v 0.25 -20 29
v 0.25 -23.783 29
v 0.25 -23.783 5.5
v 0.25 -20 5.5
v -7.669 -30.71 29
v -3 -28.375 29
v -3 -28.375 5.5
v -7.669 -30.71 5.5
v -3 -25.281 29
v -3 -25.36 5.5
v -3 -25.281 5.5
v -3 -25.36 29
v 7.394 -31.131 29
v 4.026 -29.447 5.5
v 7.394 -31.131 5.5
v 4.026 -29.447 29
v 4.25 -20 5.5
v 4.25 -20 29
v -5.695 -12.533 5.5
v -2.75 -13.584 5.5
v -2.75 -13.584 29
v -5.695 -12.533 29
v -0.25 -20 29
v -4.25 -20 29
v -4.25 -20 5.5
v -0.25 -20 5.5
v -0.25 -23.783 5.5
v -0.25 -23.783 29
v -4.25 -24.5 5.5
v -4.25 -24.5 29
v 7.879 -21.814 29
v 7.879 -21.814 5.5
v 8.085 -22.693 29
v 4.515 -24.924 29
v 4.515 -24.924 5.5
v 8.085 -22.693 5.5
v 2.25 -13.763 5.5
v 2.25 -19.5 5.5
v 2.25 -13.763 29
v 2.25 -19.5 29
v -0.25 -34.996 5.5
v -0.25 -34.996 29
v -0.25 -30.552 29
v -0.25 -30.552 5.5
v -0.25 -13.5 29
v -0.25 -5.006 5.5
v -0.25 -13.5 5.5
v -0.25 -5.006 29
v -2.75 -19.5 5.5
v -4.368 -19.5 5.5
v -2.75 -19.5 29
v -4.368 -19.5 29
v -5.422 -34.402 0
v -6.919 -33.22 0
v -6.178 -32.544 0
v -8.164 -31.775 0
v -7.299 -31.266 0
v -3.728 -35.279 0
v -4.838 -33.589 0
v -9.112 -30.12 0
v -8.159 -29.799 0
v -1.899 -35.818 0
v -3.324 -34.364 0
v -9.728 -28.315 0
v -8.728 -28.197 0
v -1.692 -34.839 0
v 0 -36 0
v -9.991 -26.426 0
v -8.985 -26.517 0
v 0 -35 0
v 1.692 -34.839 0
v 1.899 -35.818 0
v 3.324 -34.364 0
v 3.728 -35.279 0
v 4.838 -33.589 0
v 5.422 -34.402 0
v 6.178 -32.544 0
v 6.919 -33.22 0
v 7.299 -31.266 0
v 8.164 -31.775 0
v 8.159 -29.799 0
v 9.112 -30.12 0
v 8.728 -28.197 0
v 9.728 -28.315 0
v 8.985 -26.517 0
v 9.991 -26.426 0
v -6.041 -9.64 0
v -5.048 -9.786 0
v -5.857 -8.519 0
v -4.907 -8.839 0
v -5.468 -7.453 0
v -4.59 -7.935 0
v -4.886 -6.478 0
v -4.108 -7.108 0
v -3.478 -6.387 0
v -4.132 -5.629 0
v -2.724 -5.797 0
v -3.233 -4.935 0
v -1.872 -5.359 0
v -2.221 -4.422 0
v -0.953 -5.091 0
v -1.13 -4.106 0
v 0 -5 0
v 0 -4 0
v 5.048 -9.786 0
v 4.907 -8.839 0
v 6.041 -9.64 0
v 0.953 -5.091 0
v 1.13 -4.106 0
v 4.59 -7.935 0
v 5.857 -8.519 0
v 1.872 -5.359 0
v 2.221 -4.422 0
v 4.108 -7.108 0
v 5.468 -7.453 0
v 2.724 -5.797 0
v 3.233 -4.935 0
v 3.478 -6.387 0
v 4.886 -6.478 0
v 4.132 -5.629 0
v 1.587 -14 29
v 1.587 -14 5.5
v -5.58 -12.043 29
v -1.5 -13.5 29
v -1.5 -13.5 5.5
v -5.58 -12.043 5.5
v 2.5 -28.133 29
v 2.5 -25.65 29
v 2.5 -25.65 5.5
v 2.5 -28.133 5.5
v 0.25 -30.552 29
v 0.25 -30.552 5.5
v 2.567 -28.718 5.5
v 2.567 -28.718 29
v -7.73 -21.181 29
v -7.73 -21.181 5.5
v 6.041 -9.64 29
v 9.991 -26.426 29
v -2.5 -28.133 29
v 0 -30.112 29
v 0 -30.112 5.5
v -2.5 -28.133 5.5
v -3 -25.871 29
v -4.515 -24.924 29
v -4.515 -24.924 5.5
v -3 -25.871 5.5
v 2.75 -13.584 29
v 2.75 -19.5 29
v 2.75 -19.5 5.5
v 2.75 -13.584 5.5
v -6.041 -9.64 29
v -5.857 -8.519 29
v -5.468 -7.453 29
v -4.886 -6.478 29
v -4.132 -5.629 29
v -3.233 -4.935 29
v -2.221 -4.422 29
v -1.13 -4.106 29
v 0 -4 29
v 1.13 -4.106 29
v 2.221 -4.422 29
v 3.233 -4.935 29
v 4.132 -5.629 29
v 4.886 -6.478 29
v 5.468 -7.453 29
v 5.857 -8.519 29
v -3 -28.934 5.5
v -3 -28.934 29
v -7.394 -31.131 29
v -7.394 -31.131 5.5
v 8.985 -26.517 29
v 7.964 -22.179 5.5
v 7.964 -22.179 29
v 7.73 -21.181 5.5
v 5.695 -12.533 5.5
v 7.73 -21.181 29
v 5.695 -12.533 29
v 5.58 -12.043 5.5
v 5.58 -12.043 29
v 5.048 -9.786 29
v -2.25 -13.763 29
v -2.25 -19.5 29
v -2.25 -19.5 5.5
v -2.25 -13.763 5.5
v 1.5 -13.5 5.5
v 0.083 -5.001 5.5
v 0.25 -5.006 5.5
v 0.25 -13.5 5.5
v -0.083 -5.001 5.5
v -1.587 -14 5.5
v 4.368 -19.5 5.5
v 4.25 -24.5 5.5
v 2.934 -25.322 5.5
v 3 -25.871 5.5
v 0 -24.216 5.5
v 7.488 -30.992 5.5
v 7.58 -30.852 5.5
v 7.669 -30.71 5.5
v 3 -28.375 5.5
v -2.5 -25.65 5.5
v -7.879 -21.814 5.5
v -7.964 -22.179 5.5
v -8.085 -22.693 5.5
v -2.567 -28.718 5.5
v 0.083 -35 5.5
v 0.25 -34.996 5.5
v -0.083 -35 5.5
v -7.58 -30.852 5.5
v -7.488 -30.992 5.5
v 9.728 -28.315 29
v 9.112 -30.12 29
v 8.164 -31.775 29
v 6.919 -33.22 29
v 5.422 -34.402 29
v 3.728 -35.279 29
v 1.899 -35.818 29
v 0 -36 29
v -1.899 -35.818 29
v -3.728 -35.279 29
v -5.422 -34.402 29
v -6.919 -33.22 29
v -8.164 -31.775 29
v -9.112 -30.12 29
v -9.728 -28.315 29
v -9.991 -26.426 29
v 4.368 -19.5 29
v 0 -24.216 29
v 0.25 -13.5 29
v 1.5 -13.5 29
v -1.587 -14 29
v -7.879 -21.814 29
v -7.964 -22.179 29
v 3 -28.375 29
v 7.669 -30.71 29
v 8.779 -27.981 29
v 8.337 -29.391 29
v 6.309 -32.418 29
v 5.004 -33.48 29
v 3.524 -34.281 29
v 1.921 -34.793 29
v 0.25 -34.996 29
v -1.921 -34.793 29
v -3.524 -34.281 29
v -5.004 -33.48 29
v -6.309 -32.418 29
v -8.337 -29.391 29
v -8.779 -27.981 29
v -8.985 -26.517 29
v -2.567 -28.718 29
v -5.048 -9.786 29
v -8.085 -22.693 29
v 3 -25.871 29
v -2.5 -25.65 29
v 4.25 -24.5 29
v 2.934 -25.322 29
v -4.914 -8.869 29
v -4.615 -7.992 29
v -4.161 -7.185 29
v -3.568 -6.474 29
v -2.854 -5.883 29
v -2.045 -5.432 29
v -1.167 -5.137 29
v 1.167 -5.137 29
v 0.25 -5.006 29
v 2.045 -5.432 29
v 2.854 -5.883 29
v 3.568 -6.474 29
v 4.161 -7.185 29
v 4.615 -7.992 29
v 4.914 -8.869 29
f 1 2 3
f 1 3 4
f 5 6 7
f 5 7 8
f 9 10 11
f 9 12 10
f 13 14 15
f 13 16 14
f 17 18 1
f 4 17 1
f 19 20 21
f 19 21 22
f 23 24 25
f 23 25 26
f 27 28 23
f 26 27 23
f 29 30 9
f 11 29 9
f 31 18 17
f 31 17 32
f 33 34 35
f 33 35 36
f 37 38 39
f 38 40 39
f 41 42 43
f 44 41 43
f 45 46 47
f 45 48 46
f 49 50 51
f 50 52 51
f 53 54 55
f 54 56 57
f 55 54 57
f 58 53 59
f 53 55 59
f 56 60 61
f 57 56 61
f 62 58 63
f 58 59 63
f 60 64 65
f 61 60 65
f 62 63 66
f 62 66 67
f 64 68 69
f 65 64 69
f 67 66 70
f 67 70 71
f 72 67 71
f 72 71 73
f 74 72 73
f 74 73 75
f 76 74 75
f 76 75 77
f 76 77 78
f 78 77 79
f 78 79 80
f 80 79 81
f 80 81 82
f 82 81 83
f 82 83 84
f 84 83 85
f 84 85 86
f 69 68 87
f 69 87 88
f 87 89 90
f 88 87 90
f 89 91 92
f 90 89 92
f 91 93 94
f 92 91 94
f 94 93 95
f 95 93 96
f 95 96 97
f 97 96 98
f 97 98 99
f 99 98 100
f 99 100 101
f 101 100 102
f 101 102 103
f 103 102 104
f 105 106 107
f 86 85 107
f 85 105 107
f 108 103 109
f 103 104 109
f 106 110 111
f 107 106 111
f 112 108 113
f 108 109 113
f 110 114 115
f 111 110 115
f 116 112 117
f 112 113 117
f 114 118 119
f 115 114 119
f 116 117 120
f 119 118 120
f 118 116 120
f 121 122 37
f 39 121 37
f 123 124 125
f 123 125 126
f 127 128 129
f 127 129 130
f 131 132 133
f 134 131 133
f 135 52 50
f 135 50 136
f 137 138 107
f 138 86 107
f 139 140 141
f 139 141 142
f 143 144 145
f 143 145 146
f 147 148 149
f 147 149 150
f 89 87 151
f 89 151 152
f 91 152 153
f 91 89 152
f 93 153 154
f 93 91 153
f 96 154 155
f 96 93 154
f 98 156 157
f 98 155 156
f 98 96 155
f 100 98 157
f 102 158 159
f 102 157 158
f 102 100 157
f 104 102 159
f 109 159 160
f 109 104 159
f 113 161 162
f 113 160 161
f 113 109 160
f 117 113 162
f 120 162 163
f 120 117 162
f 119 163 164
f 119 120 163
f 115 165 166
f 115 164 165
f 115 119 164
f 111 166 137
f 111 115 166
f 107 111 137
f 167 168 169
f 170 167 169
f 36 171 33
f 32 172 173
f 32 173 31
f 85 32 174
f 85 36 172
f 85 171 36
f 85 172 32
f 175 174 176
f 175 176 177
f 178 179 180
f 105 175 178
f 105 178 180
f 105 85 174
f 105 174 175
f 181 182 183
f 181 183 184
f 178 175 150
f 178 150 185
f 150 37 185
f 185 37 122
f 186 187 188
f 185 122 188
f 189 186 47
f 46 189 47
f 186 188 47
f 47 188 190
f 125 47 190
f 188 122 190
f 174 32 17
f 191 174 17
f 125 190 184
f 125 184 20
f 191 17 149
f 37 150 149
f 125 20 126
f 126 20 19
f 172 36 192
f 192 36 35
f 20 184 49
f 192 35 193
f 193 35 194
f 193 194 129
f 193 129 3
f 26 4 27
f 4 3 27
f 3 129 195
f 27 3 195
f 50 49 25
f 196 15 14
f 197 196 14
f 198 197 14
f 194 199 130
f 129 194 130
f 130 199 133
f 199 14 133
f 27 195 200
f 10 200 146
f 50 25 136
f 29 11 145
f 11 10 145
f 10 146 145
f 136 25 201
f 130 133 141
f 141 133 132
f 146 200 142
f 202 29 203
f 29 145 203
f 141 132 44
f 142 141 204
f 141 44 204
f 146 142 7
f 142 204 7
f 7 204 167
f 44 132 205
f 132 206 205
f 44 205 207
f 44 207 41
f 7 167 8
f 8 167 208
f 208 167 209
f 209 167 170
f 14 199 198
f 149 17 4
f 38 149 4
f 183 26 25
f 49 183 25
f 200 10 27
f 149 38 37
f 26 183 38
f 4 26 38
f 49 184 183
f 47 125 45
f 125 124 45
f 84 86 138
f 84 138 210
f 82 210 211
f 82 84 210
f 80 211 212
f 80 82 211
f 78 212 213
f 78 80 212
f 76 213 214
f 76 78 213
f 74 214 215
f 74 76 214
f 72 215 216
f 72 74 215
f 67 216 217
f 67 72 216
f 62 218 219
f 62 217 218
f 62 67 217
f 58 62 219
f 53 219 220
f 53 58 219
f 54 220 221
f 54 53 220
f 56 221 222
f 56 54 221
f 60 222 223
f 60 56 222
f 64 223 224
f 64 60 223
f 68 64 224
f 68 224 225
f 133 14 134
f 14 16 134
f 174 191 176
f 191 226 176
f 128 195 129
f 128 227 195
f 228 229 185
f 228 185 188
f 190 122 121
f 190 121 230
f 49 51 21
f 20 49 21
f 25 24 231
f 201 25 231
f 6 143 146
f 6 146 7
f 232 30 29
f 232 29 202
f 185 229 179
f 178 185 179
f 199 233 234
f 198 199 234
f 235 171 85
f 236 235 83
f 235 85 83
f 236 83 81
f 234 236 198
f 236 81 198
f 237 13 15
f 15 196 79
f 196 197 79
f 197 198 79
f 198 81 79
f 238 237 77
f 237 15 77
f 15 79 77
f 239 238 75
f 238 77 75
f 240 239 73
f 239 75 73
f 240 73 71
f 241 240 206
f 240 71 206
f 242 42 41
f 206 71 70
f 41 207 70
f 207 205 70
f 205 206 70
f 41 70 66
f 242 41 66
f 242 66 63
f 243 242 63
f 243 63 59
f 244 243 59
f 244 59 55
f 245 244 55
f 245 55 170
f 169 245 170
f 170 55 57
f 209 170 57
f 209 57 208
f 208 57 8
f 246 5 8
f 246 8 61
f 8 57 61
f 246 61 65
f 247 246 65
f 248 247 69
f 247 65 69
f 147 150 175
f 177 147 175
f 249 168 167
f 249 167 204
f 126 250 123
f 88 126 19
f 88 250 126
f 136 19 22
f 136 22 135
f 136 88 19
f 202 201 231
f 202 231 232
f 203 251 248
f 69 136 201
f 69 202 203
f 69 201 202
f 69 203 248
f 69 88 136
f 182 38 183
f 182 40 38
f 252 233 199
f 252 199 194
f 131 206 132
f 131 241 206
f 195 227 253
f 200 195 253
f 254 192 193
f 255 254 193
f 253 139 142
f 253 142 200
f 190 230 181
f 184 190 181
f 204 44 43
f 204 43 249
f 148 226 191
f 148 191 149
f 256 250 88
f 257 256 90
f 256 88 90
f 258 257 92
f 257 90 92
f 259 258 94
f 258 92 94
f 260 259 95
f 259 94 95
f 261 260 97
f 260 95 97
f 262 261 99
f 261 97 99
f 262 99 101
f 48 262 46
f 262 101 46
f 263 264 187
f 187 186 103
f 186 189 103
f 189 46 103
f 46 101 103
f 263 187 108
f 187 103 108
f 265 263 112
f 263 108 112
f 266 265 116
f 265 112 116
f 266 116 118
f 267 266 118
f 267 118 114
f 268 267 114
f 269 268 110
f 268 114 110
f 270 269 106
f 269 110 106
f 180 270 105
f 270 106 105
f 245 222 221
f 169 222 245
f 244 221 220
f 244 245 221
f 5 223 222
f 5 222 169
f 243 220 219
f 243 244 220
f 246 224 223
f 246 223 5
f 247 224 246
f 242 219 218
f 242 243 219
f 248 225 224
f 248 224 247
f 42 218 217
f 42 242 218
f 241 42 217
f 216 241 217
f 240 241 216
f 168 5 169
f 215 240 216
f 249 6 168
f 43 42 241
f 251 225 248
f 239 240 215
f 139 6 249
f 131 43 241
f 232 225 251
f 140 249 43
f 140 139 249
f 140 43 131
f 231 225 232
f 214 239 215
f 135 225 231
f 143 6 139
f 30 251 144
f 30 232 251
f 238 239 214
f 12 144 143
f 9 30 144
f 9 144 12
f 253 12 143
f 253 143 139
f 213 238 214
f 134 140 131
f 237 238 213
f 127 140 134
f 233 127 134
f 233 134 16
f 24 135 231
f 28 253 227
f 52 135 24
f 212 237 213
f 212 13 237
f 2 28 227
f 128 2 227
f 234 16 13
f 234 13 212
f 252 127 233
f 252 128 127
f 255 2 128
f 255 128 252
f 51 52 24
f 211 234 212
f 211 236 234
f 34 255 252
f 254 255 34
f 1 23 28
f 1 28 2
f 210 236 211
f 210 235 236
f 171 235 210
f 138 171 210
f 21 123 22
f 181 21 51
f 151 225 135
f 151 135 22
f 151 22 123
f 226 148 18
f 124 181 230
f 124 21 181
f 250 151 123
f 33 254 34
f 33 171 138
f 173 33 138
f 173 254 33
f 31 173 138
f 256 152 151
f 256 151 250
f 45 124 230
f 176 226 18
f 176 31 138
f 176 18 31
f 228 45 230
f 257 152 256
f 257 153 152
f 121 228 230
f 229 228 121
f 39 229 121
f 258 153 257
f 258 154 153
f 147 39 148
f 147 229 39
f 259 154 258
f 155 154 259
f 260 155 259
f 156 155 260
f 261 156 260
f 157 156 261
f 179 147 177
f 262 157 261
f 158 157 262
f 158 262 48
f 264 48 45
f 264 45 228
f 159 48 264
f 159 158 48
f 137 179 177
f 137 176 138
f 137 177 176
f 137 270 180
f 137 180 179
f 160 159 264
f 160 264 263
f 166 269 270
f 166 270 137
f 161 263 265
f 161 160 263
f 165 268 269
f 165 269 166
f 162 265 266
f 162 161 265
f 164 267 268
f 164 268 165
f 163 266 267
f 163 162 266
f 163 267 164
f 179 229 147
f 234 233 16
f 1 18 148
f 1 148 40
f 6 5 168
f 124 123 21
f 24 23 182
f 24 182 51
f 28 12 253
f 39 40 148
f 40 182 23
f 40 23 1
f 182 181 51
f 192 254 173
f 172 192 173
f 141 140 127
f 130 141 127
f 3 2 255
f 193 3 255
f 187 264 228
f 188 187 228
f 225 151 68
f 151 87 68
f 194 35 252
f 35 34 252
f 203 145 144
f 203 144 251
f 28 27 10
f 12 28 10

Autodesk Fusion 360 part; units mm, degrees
sketch "Boceto1" plane through (0, 0, 0) normal (0, 0, 1) x (1, 0, 0)
  line L0 (0, -31.5) -> (3, -31.5) construction
  circle A0 centre (3, -22.5) radius 1.5 construction
  circle A1 centre (3, -10.5) radius 1.5 construction
  circle A2 centre (-5.5, -17.5) radius 1.5 construction
  line L1 (0, -35) -> (0, -31.5) construction
  line L2 (0, -35) -> (0, -5) construction
  line L3 (0, -20) -> (7.4517, -20) construction
  circle A3 centre (0, -16.5) radius 1.5 construction
  circle A4 centre (5.5, -17.5) radius 1.5 construction
  circle A5 centre (-3, -22.5) radius 1.5 construction
  circle A6 centre (-3, -10.5) radius 1.5 construction
  line L4 (0, -20) -> (-7.4517, -20) construction
  circle A7 centre (-5.5, -26.5) radius 1.5 construction
  line L5 (8.9851, -26.5171) -> (5.0484, -9.7858)
  arc A8 (-8.9851, -26.5171) -> (8.9851, -26.5171) centre (0, -26) ccw
  circle A9 centre (0, -26.5) radius 1.5 construction
  circle A10 centre (5.5, -26.5) radius 1.5 construction
  circle A11 centre (3, -31.5) radius 1.5 construction
  line L6 (0, -26.5) -> (5.5, -26.5) construction
  circle A12 centre (-3, -31.5) radius 1.5 construction
  line L7 (0, -35) -> (0, -26.5) construction
  line L8 (-5.0484, -9.7858) -> (-8.9851, -26.5171)
  arc A13 (5.0484, -9.7858) -> (-5.0484, -9.7858) centre (0, -10.0556) ccw
  arc A14 (6.0413, -9.6396) -> (-6.0413, -9.6396) centre (0, -10.0556) ccw
  line L9 (-6.0413, -9.6396) -> (-9.9909, -26.4257)
  arc A15 (-9.9909, -26.4257) -> (9.9909, -26.4257) centre (0, -26) ccw
  line L10 (9.9909, -26.4257) -> (6.0413, -9.6396)
  line L11 (5.5, -17.5) -> (4.5, -17.5) construction
  line L12 (-5.5, -17.5) -> (-4.5, -17.5) construction
  circle A16 centre (4.5, -17.5) radius 1.5 construction
  circle A17 centre (-4.5, -17.5) radius 1.5 construction
  line L13 (3, -10.5) -> (2.5, -10.5) construction
  line L14 (-3, -10.5) -> (-2.5, -10.5) construction
  circle A18 centre (2.5, -10.5) radius 1.5 construction
  circle A19 centre (-2.5, -10.5) radius 1.5 construction
  dimension "d3" = 0
  dimension "d4" = 9
  dimension "d7" = 0
  dimension "d8" = 10
  dimension "d11" = 0
  dimension "d12" = 21
  dimension "d15" = 0
  dimension "d16" = 9
  dimension "d17" = 3
  dimension "d18" = 3.5
  dimension "d19" = 3
  dimension "d20" = 3
  dimension "d21" = 3
  dimension "d22" = 5
  dimension "d23" = 5.5
  dimension "d24" = 1
  dimension "d48" = 1
  dimension "d49" = 1
  dimension "d50" = 3
  dimension "d51" = 3
  dimension "d52" = 0.5
  dimension "d53" = 3
  dimension "d54" = 3
extrude "Extruir1" add sketch "Boceto1" along normal blind 29
sketch "Boceto2" plane through (0, 0, 29) normal (0, 0, 1) x (-1, 0, 0)
  arc A0 (-5.0484, 9.7858) -> (5.0484, 9.7858) centre (0, 10.0556) ccw
  line L0 (-5.0484, 9.7858) -> (-8.9851, 26.5171)
  arc A1 (8.9851, 26.5171) -> (-8.9851, 26.5171) centre (0, 26) ccw
  line L1 (8.9851, 26.5171) -> (5.0484, 9.7858)
  line L2 (-9.9909, 26.4257) -> (-6.0413, 9.6396)
  arc A2 (-6.0413, 9.6396) -> (6.0413, 9.6396) centre (0, 10.0556) ccw
  line L3 (6.0413, 9.6396) -> (9.9909, 26.4257)
  arc A3 (9.9909, 26.4257) -> (-9.9909, 26.4257) centre (0, 26) ccw
  circle A4 centre (-5.5, 26.5) radius 1.5
  circle A5 centre (-3, 31.5) radius 1.5
  circle A6 centre (3, 31.5) radius 1.5
  circle A7 centre (0, 26.5) radius 1.5
  line L4 (0, 35) -> (0, 26.5)
  circle A8 centre (-3, 22.5) radius 1.5
  circle A9 centre (-5.5, 17.5) radius 1.5
  circle A10 centre (-3, 10.5) radius 1.5
  circle A11 centre (3, 10.5) radius 1.5
  circle A12 centre (0, 16.5) radius 1.5
  circle A13 centre (5.5, 17.5) radius 1.5
  circle A14 centre (3, 22.5) radius 1.5
  circle A15 centre (5.5, 26.5) radius 1.5
  line L5 (-3, 31.5) -> (-5.5, 26.5) construction
  line L6 (3, 31.5) -> (5.5, 26.5) construction
  line L7 (-3, 22.5) -> (0, 26.5) construction
  line L8 (-3, 22.5) -> (-5.5, 26.5) construction
  line L9 (-5.5, 17.5) -> (-3, 22.5) construction
  line L10 (-5.5, 17.5) -> (0, 16.5) construction
  line L11 (0, 16.5) -> (-3, 10.5) construction
  line L12 (-4.25, 29) -> (-7.6694, 30.7097)
  line L13 (-4.25, 24.5) -> (-7.9643, 22.1786)
  line L14 (-4.25, 20) -> (-7.8786, 21.8143)
  line L15 (-3, 28.375) -> (2.011, 25.8695) construction
  line L16 (-3, 25.2812) -> (3.382, 29.27) construction
  line L17 (-3, 26.5) -> (-3, 28.375)
  line L18 (0, 23.6397) -> (-3, 25.3603)
  line L19 (0, 30.75) -> (-3, 28.375)
  line L20 (-4.25, 29) -> (-3, 28.375)
  line L21 (-4.25, 24.5) -> (-2.9341, 25.3225)
  line L22 (-4.25, 20) -> (0, 20)
  line L23 (-1.5, 13.5) -> (0, 13.5)
  line L24 (-1.5, 13.5) -> (-5.5795, 12.043)
  line L25 (0, 30.75) -> (3, 28.375)
  line L26 (4.25, 29) -> (7.6694, 30.7097)
  line L27 (4.25, 29) -> (3, 28.375)
  line L28 (3, 26.5) -> (3, 28.375)
  line L29 (3, 25.3603) -> (3, 25.2812)
  line L30 (0, 23.6397) -> (3, 25.3603)
  line L31 (4.25, 24.5) -> (2.9341, 25.3225)
  line L32 (4.25, 24.5) -> (7.9643, 22.1786)
  line L33 (4.25, 20) -> (7.8786, 21.8143)
  line L34 (4.25, 20) -> (0, 20)
  line L35 (1.5, 13.5) -> (5.5795, 12.043)
  line L36 (1.5, 13.5) -> (0, 13.5)
  line L37 (-1.5866, 14) -> (-5.7476, 12.5139)
  line L38 (-1.5866, 14) -> (0, 14)
  line L39 (-4.368, 19.5) -> (0, 19.5)
  line L40 (-4.368, 19.5) -> (-8.1022, 21.3671)
  line L41 (-3, 26.5) -> (-3, 25.3603)
  line L42 (3, 26.5) -> (3, 25.3603)
  line L43 (0, 30.1123) -> (-2.5, 28.1331)
  line L44 (-2.5, 26.5) -> (-2.5, 28.1331)
  line L45 (-2.5, 26.5) -> (-2.5, 25.6499)
  line L46 (0, 24.2161) -> (-2.5, 25.6499)
  line L47 (0, 24.2161) -> (2.5, 25.6499)
  line L48 (2.5, 26.5) -> (2.5, 25.6499)
  line L49 (2.5, 26.5) -> (2.5, 28.1331)
  line L50 (0, 30.1123) -> (2.5, 28.1331)
  line L51 (-4.515, 24.924) -> (-8.2293, 22.6026)
  line L52 (-4.515, 24.924) -> (-3, 25.8709)
  line L53 (4.515, 24.924) -> (3, 25.8709)
  line L54 (4.515, 24.924) -> (8.2293, 22.6026)
  line L55 (-4.0264, 29.4472) -> (-7.4457, 31.1569)
  line L56 (-4.0264, 29.4472) -> (-2.5672, 28.7176)
  line L57 (3, 28.934) -> (7.4457, 31.1569)
  line L58 (4.0264, 29.4472) -> (2.5672, 28.7176)
  line L59 (2.8037, 19.5) -> (2.7874, 19.5894)
  line L60 (4.368, 19.5) -> (8.1022, 21.3671)
  line L61 (4.368, 19.5) -> (0, 19.5)
  line L62 (1.5866, 14) -> (0, 14)
  line L63 (1.5866, 14) -> (5.7476, 12.5139)
  line L64 (0, 5) -> (0, 13.5)
  line L65 (0.25, 5) -> (0.25, 13.5)
  line L66 (-0.25, 5) -> (-0.25, 13.5)
  line L67 (-0.25, 23.7831) -> (-0.25, 20)
  line L68 (0.25, 23.7831) -> (0.25, 20)
  line L69 (-0.25, 35) -> (-0.25, 30.5521)
  line L70 (0.25, 35) -> (0.25, 30.5521)
  line L71 (0, 26.5) -> (0, 25)
  line L72 (0, 20) -> (0, 19.5)
  line L73 (0, 18) -> (0, 16.5)
  line L74 (-3.2659, 16.9578) -> (-3.2419, 17.0894)
  line L75 (-2.75, 17) -> (-2.75, 19.5)
  line L76 (-2.75, 17) -> (-2.75, 13.5845)
  line L77 (-2.75, 19.5) -> (-2.25, 19.5)
  line L78 (-2.25, 19.5) -> (-2.25, 13.7631)
  line L79 (2.25, 19.5) -> (2.25, 13.7631)
  line L80 (2.75, 17) -> (2.75, 13.5845)
  line L81 (2.75, 17) -> (2.75, 19.5)
  dimension "d27" = 7
  dimension "d28" = 9
  dimension "d29" = -0.5
  dimension "d31" = 0.5
  dimension "d32" = -0.5
  dimension "d38" = 0.5
  dimension "d39" = -0.5
  dimension "d40" = 0.25
  dimension "d41" = -0.25
  dimension "d55" = 0.5
extrude "Extruir2" add sketch "Boceto2" against normal blind 23.5 contours A0 L23 L64 L66 | L0 L1 L23 L24 L35 L36 L37 L38 L62 L63 | A0 L36 L64 L65 | L37 L39 L75 L76 L77 L78 | L0 L14 L22 L39 L40 L72 L77 | L1 L33 L34 L60 L61 L72 | L61 L63 L79 L80 L81 | L0 L13 L18 L21 L41 L51 L52 | L18 L22 L30 L34 L67 L68 | L17 L18 L19 L25 L28 L30 L41 L42 | A1 L12 L19 L20 L55 L56 | L1 L29 L31 L32 L42 L53 L54 | A1 L4 L19 L69 | A1 L4 L25 L70 | A1 L25 L26 L27 L57 L58
equation "d25 = 5 mm + 18 mm + 5 mm + 1 mm"
